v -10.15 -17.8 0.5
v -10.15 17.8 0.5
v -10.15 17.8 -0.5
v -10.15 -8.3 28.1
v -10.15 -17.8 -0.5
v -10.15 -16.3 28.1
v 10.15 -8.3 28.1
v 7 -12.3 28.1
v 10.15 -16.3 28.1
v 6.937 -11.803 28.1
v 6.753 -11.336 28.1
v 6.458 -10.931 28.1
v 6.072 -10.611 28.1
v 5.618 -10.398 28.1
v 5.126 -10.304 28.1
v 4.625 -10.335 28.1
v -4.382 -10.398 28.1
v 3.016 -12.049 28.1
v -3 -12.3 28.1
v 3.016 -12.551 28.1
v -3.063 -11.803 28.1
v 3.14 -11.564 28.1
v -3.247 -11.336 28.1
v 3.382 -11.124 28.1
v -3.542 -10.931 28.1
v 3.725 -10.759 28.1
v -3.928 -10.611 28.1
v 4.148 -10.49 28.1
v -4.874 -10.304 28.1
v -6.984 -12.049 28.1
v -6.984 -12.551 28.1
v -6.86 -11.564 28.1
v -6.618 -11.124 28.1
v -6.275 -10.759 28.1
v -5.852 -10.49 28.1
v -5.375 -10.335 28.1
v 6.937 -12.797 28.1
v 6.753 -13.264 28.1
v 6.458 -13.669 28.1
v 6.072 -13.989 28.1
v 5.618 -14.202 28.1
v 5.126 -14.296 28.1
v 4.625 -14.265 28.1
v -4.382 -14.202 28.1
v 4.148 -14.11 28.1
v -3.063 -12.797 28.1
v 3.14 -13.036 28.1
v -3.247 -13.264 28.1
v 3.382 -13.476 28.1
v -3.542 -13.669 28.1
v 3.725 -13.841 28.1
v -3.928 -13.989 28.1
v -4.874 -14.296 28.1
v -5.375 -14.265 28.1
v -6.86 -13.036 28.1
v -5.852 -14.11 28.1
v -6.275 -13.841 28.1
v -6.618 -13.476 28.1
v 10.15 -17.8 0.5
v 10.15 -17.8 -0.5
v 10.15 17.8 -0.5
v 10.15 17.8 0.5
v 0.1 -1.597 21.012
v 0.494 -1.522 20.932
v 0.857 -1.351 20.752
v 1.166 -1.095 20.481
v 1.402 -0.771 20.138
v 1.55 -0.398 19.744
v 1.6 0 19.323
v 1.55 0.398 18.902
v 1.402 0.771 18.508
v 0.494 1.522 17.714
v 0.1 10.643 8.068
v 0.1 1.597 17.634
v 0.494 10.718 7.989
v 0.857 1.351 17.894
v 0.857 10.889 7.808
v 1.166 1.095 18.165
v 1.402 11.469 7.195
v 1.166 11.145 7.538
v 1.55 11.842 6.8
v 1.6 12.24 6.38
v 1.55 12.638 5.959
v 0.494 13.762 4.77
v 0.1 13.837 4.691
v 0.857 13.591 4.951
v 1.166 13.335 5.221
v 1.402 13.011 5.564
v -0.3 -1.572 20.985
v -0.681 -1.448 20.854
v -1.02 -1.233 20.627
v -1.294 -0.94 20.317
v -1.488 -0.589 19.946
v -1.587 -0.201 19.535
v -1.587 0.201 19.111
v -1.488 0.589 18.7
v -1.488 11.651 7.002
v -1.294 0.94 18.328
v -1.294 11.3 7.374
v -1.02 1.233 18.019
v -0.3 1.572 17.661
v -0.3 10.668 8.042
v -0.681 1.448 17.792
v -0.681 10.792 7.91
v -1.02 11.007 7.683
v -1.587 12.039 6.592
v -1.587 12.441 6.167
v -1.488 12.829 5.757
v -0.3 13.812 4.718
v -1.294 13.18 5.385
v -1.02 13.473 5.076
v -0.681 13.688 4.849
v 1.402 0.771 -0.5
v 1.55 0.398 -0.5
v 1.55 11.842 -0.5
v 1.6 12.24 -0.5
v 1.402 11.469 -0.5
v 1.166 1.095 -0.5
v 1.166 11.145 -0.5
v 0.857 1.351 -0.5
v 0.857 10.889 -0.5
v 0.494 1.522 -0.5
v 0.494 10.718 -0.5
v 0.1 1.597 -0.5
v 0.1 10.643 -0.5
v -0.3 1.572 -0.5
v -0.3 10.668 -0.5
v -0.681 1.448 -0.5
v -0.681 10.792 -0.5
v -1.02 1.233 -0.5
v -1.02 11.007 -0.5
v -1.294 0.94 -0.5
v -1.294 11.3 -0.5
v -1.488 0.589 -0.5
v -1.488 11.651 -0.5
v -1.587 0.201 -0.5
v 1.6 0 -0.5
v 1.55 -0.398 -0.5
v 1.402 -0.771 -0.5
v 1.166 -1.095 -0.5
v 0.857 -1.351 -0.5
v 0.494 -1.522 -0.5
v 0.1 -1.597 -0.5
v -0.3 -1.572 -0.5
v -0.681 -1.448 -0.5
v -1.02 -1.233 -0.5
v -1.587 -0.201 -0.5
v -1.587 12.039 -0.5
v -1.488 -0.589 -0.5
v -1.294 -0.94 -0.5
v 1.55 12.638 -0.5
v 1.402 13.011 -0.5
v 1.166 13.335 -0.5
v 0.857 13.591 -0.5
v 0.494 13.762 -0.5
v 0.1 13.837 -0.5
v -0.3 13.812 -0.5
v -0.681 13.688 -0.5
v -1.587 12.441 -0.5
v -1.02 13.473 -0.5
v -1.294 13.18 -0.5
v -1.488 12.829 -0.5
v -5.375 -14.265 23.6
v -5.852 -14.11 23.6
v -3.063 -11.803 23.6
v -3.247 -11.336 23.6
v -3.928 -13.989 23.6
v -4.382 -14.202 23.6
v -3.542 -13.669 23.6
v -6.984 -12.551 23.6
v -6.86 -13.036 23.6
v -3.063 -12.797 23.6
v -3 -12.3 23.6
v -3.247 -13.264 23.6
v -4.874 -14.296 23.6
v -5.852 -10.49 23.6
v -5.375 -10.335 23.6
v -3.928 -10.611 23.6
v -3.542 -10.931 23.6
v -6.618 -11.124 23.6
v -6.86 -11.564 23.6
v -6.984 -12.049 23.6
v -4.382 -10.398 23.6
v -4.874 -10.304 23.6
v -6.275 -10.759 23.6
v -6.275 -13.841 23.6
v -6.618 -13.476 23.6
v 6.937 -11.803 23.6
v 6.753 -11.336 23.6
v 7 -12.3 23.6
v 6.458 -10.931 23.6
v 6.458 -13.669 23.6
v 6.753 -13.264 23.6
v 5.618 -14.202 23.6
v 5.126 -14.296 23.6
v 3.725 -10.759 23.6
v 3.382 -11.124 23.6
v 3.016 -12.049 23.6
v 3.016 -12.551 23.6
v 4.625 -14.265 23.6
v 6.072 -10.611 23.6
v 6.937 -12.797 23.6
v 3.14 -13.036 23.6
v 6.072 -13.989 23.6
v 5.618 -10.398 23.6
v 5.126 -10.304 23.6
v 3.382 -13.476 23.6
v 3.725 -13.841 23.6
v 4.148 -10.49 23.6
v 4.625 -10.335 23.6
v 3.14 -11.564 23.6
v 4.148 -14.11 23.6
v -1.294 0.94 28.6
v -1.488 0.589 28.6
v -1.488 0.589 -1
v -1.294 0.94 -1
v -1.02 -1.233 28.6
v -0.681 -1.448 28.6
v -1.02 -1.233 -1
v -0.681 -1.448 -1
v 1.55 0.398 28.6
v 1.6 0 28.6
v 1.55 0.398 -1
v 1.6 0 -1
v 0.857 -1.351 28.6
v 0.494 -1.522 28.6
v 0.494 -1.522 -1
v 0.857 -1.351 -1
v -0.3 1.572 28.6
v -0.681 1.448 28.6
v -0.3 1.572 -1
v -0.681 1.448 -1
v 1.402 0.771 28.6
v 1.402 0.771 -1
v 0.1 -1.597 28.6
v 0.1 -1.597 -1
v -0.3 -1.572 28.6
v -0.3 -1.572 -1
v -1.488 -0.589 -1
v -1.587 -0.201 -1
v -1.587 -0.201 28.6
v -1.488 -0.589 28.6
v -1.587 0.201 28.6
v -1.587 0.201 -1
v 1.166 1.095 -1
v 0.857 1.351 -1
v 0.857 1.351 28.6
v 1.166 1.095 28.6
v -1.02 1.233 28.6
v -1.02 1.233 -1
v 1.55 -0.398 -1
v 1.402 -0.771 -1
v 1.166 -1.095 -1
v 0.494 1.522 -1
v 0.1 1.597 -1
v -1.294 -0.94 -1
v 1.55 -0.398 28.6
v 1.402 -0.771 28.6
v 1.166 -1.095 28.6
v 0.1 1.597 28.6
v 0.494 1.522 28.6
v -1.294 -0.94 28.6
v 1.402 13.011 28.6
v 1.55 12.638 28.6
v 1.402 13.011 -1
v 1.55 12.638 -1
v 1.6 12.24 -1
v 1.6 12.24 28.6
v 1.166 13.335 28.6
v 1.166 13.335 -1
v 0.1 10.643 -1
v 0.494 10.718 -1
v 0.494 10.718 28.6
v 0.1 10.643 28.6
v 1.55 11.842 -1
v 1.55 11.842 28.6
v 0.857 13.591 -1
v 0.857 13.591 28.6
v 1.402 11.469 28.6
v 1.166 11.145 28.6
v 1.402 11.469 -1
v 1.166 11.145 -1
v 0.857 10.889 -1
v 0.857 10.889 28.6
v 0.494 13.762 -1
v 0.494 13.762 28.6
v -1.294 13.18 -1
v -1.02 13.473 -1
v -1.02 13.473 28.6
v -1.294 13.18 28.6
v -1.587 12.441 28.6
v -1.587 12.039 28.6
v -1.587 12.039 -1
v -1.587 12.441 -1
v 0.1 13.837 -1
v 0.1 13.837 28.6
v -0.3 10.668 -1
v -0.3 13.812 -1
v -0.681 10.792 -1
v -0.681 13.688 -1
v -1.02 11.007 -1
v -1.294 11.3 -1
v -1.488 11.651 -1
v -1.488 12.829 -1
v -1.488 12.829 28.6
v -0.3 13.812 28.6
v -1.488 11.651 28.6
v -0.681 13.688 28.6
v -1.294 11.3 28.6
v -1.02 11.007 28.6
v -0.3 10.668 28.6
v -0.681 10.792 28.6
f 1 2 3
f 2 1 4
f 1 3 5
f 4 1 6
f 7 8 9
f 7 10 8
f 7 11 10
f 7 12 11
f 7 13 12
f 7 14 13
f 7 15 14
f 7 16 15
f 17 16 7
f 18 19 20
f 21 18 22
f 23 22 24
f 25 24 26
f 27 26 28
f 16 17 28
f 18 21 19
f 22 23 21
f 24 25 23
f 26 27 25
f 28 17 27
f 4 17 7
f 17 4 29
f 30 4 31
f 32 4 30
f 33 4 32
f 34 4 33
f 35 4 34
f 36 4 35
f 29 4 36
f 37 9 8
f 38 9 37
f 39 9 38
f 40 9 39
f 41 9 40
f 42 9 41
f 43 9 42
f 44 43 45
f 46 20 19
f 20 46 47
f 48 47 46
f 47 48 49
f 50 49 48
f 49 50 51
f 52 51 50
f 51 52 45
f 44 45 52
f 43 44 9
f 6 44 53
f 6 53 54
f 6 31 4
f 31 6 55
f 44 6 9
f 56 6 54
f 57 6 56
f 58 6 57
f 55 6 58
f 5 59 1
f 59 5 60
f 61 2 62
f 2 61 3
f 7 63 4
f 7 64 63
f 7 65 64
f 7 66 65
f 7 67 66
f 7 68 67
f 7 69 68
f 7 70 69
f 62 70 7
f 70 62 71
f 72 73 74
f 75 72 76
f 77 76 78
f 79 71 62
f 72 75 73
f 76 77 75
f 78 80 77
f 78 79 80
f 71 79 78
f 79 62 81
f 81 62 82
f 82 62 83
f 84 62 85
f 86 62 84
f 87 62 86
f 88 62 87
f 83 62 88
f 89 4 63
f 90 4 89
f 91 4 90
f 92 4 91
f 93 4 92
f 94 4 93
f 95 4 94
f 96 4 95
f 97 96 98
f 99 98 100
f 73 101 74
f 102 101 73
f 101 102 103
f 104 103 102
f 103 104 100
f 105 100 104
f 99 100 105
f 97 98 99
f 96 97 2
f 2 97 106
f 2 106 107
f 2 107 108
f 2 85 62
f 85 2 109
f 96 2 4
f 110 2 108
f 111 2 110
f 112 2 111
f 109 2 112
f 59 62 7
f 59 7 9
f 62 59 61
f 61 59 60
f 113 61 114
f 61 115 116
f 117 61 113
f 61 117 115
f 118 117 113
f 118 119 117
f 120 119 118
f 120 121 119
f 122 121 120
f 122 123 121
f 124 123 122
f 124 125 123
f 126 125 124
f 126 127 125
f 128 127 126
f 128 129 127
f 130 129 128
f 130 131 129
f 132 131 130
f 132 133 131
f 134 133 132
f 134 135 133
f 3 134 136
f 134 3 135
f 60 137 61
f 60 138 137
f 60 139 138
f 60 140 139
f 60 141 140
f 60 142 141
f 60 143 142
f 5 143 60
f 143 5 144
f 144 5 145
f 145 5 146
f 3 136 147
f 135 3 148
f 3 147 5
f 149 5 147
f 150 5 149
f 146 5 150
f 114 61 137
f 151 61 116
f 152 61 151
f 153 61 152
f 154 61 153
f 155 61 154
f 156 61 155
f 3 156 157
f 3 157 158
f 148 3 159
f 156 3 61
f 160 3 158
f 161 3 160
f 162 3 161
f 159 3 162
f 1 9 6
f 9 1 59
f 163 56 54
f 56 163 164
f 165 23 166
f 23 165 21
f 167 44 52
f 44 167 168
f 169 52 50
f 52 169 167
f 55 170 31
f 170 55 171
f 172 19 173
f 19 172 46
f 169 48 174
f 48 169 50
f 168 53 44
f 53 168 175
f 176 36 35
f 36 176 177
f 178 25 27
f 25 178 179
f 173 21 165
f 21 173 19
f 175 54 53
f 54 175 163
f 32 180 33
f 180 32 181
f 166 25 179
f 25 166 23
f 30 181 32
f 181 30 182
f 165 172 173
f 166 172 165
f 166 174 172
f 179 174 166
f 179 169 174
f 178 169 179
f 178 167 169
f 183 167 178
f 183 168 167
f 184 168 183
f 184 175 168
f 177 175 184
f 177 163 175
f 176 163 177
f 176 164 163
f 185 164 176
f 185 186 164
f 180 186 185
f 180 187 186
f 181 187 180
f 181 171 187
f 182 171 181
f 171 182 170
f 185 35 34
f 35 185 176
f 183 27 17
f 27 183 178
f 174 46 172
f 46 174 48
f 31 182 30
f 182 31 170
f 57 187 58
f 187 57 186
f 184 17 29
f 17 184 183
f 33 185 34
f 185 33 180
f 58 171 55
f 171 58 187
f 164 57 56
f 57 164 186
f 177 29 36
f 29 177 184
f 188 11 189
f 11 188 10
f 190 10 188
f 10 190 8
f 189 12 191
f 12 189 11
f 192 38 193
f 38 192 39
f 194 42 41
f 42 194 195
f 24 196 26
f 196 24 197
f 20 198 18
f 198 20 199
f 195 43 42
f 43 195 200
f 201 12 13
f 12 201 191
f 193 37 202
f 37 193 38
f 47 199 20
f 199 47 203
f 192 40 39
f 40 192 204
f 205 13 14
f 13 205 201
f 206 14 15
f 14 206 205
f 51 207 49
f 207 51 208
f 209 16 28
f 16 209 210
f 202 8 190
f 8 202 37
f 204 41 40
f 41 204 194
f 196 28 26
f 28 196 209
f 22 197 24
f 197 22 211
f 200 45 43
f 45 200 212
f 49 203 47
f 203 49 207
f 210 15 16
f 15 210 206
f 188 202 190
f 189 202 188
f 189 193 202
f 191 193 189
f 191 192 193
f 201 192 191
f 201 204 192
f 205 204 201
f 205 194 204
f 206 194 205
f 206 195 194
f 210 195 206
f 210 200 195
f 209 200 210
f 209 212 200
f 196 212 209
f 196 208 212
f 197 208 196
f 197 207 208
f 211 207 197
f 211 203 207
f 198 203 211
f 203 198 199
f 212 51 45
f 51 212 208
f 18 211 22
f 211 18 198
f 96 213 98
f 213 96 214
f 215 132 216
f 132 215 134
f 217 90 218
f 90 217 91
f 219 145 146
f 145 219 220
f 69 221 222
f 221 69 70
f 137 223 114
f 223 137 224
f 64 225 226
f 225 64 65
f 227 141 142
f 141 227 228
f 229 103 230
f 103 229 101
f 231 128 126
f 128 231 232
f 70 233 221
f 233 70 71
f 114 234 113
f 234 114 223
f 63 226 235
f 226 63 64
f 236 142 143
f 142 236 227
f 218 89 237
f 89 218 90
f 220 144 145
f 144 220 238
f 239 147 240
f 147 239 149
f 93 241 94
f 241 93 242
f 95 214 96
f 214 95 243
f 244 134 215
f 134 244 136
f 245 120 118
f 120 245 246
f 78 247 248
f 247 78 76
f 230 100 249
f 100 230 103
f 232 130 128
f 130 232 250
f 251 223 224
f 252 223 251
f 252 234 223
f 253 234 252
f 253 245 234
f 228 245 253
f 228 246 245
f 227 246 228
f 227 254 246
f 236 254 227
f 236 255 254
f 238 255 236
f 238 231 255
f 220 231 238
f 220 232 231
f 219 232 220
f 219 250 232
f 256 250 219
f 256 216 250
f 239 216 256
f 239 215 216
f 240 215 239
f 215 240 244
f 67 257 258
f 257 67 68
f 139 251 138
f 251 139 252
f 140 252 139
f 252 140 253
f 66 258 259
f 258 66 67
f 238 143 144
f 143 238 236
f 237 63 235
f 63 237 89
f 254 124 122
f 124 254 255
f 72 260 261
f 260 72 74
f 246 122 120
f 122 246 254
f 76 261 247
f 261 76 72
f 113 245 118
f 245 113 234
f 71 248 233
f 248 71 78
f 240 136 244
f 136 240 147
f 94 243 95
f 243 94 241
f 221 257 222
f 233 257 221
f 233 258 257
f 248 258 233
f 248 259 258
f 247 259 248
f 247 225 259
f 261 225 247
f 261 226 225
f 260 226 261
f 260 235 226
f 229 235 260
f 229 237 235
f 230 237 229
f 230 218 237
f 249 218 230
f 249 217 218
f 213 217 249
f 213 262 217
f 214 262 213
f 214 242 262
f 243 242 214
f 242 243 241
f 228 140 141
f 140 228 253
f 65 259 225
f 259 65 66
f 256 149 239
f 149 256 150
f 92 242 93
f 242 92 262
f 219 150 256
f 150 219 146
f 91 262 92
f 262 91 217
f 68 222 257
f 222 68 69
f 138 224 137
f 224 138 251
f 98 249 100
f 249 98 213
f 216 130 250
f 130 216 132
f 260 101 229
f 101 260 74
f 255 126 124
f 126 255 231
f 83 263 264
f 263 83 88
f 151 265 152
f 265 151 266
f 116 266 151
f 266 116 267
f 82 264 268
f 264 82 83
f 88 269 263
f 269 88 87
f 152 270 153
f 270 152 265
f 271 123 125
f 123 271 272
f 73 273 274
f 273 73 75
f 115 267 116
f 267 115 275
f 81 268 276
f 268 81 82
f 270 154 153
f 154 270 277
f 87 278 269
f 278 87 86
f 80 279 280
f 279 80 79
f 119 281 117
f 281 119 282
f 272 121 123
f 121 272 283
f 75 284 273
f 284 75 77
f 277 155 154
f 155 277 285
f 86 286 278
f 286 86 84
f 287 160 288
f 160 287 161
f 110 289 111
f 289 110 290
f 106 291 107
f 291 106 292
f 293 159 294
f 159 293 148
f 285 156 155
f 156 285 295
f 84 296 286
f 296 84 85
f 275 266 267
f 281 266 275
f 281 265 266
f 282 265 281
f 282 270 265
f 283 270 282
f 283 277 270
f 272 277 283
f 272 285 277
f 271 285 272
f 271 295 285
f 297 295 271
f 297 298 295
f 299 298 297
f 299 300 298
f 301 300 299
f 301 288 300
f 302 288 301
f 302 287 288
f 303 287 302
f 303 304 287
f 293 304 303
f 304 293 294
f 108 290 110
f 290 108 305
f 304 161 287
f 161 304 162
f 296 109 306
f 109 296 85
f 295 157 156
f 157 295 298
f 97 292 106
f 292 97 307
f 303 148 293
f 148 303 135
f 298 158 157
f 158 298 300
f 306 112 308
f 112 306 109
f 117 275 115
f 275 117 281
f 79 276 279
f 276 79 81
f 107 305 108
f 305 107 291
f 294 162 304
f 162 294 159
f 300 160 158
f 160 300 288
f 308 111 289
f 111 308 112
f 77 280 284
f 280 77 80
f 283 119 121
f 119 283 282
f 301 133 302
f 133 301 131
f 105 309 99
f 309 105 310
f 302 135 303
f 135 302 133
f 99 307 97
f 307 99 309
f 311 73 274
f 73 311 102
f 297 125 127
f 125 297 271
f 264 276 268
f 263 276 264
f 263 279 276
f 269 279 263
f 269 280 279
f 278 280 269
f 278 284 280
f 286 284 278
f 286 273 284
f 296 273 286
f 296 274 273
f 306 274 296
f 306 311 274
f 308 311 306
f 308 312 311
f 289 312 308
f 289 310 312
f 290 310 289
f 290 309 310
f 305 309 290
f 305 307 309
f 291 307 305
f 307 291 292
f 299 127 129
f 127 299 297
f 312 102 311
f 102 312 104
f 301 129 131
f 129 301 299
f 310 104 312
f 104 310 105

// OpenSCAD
mb_measure = 15;
tolerance = 0.3;
mb = mb_measure + tolerance;
centerPoint = (mb_measure + tolerance) / 2;
boltHoles = 3.2;
centerStrip = 3.0;
servoWidth = 20 + tolerance;
servoLength = 40 + tolerance;
servoLedge = 8;
servoLedgeHeight = 27.6;
servoMntHoles = 2.5;
servoHoleXOnCenter = 10;
servoHoleYOnCenter = 50;
threadedInsertDiameter = 4;
threadedInsertRadius = threadedInsertDiameter / 2;
threadedInsertDepth = 5;
$fn = 25;



////
difference() {

    hull(){
        translate([0, servoLedge - servoWidth, servoLedgeHeight])
            cube([servoWidth,servoLedge, 1],center=true);
        
        cube([servoWidth, servoWidth + mb, 1], center=true);
    }

    color("teal")
        translate([-1 * (servoHoleXOnCenter/2), servoLedge - servoWidth, servoLedgeHeight - (0.8 * threadedInsertDepth) ])
            cylinder(h = threadedInsertDepth, r = threadedInsertRadius);
    
    color("red")
        translate([(servoHoleXOnCenter/2),  (servoLedge - servoWidth) , servoLedgeHeight - (0.8 * threadedInsertDepth)  ])
            cylinder(h = threadedInsertDepth, r = threadedInsertRadius);

}

    
    color("green")
        translate([0, 0, -1])
        cylinder(h = (servoLedgeHeight + 2), r = (boltHoles / 2));

    
    color("green")
        translate([0, mb * 0.8, -1])
        cylinder(h = (servoLedgeHeight + 2), r = (boltHoles / 2));
